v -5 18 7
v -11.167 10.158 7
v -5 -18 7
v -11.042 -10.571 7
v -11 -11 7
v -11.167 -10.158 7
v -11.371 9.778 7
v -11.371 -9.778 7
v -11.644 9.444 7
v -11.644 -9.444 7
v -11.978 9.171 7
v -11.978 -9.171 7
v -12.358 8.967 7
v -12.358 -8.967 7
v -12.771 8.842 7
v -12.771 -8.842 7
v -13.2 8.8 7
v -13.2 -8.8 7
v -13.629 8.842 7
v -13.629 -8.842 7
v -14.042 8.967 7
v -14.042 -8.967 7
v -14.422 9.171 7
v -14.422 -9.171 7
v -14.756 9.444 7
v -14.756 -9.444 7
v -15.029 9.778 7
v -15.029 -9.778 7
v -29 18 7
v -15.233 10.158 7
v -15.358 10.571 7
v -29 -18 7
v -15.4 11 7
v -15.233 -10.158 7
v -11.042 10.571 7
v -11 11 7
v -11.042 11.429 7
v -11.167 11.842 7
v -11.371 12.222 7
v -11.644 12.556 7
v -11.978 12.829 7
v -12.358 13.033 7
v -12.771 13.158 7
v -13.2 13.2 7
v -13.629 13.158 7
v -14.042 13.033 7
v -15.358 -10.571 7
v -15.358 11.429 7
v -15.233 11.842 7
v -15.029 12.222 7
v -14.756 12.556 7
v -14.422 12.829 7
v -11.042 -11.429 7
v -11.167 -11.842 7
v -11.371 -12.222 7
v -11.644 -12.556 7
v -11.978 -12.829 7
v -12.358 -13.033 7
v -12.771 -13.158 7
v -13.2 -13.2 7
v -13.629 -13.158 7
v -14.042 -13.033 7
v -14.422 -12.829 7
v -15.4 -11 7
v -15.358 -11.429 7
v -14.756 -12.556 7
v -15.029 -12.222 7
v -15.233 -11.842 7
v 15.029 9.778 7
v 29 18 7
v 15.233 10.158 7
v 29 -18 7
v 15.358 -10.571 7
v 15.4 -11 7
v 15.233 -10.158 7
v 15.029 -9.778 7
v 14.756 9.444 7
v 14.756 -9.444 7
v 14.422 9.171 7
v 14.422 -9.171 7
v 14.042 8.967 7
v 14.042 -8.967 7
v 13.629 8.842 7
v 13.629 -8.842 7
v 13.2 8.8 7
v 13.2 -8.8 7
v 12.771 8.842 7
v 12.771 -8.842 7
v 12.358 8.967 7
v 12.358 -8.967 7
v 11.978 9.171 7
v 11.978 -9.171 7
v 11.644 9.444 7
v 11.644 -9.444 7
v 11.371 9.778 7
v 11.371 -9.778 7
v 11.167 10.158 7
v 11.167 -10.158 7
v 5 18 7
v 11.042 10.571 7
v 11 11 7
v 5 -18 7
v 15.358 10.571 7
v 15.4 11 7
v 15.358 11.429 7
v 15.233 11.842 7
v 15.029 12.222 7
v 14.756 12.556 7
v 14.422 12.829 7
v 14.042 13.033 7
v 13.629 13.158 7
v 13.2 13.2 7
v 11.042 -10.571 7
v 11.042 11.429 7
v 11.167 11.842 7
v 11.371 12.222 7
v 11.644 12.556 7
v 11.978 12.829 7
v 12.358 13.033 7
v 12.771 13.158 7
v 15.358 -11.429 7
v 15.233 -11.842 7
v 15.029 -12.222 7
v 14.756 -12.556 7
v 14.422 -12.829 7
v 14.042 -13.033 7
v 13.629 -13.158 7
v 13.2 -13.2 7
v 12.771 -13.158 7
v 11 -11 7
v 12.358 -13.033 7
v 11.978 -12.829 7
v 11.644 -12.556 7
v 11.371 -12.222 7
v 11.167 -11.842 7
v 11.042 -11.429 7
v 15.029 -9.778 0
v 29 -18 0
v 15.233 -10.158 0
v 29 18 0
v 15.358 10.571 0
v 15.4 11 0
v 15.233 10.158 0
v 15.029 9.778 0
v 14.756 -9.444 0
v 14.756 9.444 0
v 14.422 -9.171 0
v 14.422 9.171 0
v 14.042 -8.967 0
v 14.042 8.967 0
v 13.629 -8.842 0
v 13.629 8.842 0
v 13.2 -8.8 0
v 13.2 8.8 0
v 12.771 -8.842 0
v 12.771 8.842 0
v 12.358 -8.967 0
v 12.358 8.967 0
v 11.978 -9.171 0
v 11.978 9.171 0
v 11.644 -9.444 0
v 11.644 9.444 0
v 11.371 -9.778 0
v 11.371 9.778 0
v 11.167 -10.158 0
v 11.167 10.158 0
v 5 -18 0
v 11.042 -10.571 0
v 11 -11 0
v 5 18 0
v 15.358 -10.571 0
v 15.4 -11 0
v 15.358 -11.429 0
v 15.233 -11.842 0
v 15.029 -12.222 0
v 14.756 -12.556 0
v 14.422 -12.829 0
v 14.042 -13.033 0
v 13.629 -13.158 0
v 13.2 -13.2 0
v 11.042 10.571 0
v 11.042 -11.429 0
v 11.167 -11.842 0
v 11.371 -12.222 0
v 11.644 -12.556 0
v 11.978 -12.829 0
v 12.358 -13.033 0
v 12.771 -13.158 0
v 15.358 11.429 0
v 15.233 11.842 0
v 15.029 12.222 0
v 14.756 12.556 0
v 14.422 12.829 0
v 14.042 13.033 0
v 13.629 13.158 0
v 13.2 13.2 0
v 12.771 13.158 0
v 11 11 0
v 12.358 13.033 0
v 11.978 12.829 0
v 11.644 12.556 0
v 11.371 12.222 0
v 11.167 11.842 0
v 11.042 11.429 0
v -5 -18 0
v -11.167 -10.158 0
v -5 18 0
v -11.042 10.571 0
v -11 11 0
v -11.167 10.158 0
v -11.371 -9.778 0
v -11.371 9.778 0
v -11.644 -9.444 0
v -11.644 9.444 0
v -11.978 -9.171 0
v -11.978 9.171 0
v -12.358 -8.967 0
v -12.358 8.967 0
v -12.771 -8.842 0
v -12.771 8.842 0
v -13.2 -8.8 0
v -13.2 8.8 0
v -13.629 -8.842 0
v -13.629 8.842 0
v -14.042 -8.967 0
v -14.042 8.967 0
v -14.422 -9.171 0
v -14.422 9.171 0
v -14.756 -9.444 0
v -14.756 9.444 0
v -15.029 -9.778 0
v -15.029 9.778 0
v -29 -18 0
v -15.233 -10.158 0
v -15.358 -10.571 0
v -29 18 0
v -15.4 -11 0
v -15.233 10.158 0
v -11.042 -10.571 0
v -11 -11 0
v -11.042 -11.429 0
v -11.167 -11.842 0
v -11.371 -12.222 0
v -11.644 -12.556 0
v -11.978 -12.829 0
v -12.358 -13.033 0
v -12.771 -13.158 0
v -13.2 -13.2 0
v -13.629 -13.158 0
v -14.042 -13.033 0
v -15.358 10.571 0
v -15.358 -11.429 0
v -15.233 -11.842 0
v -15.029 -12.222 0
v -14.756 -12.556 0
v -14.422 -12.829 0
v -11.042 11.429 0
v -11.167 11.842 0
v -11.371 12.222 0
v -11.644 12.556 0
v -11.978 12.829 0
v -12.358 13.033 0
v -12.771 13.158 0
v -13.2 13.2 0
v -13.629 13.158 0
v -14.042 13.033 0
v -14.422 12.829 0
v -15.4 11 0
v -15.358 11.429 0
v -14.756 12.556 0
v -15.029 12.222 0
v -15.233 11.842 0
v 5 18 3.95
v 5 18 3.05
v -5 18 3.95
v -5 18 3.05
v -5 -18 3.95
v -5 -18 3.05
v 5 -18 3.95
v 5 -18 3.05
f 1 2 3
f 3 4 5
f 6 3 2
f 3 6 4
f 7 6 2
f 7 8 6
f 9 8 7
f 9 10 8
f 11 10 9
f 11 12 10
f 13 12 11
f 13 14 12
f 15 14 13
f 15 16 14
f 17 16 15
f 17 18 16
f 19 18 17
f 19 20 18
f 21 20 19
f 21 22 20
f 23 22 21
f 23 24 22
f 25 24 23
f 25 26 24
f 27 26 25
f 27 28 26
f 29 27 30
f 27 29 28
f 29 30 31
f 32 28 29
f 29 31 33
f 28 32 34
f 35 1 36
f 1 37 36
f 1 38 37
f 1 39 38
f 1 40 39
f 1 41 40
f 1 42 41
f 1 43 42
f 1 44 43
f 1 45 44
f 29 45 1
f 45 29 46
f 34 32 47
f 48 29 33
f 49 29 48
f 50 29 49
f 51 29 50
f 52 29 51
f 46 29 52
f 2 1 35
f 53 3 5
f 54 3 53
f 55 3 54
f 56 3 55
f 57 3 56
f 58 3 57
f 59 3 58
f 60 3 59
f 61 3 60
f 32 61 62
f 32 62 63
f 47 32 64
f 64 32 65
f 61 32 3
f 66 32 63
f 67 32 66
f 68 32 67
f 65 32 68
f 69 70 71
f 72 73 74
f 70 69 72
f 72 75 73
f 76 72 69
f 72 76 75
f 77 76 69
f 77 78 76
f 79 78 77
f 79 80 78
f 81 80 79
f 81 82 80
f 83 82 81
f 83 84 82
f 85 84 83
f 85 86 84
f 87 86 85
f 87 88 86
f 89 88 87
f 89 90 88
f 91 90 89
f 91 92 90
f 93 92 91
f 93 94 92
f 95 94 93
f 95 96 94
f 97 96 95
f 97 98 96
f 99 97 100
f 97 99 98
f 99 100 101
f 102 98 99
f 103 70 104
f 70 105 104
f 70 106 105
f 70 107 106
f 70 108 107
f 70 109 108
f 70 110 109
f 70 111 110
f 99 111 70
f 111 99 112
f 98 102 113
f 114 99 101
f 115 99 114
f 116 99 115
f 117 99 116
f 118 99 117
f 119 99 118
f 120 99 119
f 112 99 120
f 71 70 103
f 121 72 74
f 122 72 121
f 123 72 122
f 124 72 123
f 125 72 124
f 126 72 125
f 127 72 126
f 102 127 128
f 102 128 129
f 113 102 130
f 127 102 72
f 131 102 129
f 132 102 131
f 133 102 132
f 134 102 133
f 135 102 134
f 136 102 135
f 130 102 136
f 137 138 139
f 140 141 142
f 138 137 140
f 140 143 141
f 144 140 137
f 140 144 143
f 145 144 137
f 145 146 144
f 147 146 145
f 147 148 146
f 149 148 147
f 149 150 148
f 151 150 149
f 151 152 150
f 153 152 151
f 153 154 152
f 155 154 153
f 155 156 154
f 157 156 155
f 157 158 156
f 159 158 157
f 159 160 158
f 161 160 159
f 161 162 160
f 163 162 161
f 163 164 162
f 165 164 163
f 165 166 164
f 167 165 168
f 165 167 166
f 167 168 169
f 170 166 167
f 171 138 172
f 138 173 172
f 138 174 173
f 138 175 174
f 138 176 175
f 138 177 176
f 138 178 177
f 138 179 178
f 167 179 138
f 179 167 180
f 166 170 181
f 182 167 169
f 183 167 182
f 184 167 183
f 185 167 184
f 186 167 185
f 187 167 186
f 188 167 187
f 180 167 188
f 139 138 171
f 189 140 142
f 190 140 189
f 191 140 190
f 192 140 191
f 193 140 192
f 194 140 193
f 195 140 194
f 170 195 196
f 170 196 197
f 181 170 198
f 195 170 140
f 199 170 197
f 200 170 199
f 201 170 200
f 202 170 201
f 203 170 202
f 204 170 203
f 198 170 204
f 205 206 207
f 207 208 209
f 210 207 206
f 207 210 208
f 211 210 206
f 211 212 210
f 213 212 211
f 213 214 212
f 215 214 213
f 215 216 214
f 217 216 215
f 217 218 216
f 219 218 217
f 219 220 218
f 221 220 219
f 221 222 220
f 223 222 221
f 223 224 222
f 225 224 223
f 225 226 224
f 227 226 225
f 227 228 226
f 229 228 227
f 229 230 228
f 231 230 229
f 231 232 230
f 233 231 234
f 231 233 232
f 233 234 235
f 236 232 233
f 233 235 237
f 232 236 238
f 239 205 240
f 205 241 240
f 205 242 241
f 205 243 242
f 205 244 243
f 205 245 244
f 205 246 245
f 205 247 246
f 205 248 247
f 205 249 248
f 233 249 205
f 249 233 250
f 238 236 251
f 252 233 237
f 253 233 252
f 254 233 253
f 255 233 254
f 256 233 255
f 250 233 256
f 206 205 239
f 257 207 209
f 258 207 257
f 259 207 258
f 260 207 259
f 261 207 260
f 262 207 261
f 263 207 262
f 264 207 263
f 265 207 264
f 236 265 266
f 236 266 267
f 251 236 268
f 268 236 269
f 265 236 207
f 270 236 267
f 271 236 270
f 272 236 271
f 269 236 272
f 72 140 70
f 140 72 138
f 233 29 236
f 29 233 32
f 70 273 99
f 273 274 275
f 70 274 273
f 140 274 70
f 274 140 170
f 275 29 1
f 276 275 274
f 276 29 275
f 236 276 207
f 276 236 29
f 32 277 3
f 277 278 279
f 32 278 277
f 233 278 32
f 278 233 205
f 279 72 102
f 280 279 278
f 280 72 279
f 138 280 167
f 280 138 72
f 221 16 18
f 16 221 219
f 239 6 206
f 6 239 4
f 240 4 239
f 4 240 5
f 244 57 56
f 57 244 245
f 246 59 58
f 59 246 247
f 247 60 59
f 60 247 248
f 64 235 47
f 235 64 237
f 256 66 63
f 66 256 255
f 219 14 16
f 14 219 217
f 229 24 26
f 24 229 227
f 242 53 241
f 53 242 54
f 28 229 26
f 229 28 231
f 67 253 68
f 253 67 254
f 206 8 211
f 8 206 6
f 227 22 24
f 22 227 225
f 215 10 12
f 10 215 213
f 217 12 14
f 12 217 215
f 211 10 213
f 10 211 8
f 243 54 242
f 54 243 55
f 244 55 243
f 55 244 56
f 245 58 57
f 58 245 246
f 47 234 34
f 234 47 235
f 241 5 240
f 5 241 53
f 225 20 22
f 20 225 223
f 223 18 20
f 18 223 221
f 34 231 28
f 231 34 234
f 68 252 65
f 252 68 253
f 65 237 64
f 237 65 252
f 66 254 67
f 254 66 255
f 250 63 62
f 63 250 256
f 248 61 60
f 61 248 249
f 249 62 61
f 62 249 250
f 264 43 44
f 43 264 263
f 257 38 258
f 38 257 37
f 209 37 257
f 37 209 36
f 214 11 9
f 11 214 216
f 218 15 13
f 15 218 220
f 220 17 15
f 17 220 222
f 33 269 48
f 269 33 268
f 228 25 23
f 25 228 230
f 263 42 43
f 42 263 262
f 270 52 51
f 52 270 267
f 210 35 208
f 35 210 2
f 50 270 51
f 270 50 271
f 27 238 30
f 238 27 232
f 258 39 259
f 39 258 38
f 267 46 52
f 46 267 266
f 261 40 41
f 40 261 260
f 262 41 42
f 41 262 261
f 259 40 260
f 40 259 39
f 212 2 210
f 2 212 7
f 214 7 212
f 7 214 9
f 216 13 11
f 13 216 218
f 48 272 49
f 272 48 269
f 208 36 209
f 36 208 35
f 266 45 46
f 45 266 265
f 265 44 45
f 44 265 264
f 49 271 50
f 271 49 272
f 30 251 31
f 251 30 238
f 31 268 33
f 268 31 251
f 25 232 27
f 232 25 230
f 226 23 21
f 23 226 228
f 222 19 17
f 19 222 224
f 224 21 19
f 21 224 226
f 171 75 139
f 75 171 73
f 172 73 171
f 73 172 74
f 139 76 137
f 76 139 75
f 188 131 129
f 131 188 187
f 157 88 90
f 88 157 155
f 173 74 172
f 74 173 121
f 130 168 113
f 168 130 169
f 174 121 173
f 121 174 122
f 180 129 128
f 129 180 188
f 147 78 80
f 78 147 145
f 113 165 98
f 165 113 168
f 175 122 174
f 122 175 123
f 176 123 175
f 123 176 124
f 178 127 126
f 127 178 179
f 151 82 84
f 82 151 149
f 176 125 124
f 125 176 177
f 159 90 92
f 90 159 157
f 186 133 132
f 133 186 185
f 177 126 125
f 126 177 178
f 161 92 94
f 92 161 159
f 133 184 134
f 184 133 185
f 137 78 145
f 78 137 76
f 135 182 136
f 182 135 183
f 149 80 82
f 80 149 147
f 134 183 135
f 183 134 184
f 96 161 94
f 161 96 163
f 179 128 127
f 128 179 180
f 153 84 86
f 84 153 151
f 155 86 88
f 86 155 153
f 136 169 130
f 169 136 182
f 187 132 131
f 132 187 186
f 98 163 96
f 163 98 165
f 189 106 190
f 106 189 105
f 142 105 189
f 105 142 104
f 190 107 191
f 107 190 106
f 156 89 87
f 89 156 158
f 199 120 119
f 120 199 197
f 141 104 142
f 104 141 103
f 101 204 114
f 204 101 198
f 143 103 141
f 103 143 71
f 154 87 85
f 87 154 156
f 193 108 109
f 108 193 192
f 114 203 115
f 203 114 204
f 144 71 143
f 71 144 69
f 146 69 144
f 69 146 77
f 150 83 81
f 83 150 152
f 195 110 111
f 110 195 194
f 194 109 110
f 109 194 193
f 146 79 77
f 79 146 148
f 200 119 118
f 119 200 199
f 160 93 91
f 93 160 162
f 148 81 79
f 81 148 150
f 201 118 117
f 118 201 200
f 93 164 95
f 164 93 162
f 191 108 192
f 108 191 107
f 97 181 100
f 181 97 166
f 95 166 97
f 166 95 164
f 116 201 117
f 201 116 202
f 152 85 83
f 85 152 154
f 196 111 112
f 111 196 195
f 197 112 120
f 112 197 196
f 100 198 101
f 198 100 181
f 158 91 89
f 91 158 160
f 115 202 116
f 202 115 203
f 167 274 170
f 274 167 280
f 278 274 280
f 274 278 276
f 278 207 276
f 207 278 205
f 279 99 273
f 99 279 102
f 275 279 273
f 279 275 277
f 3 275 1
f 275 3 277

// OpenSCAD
$fn = 32;

// ----------------------------------------------------------------------
// Living hinge: 58 x 36 mm plates, 0.9 mm flexible web
// ----------------------------------------------------------------------

// --- parameters (mm) ---
plate_len = 24;           // plate length outside the web
plate_w = 36;             // plate width
thick = 7;                // plate thickness
web_half = 5;             // half width of the flex band
web_t = 0.9;              // flexible web thickness
web_z = 3.05;             // web position inside the thickness
boss_d = 10;              // screw boss diameter
boss_h = 7;               // screw boss height
boss_x = 13.2;            // screw boss distance from the web
screw_d = 4.4;            // screw hole

difference() {
  union() {
    /* one flat strip, later thinned at the middle */
    translate([-29, -18, 0]) cube([58, 36, 7]);
    /* screw bosses, sunk 0.5 mm into the plates */
    for (sx = [-13.2, 13.2]) {
      for (sy = [-11, 11]) {
        translate([sx, sy, 0]) cylinder(h = boss_h, d = boss_d);
      }
    }
  }
  /* channel from below: leaves the web on top of it */
  translate([-5, -20.5, -2.5]) cube([10, 41, 5.55]);
  /* channel from above: thins the web down to web_t */
  translate([-5, -20.5, 3.95]) cube([10, 41, 5.55]);
  /* screw holes through the bosses */
  for (sx = [-13.2, 13.2]) {
    for (sy = [-11, 11]) {
      translate([sx, sy, -2.5]) cylinder(h = boss_h + 5, d = screw_d);
    }
  }
}
